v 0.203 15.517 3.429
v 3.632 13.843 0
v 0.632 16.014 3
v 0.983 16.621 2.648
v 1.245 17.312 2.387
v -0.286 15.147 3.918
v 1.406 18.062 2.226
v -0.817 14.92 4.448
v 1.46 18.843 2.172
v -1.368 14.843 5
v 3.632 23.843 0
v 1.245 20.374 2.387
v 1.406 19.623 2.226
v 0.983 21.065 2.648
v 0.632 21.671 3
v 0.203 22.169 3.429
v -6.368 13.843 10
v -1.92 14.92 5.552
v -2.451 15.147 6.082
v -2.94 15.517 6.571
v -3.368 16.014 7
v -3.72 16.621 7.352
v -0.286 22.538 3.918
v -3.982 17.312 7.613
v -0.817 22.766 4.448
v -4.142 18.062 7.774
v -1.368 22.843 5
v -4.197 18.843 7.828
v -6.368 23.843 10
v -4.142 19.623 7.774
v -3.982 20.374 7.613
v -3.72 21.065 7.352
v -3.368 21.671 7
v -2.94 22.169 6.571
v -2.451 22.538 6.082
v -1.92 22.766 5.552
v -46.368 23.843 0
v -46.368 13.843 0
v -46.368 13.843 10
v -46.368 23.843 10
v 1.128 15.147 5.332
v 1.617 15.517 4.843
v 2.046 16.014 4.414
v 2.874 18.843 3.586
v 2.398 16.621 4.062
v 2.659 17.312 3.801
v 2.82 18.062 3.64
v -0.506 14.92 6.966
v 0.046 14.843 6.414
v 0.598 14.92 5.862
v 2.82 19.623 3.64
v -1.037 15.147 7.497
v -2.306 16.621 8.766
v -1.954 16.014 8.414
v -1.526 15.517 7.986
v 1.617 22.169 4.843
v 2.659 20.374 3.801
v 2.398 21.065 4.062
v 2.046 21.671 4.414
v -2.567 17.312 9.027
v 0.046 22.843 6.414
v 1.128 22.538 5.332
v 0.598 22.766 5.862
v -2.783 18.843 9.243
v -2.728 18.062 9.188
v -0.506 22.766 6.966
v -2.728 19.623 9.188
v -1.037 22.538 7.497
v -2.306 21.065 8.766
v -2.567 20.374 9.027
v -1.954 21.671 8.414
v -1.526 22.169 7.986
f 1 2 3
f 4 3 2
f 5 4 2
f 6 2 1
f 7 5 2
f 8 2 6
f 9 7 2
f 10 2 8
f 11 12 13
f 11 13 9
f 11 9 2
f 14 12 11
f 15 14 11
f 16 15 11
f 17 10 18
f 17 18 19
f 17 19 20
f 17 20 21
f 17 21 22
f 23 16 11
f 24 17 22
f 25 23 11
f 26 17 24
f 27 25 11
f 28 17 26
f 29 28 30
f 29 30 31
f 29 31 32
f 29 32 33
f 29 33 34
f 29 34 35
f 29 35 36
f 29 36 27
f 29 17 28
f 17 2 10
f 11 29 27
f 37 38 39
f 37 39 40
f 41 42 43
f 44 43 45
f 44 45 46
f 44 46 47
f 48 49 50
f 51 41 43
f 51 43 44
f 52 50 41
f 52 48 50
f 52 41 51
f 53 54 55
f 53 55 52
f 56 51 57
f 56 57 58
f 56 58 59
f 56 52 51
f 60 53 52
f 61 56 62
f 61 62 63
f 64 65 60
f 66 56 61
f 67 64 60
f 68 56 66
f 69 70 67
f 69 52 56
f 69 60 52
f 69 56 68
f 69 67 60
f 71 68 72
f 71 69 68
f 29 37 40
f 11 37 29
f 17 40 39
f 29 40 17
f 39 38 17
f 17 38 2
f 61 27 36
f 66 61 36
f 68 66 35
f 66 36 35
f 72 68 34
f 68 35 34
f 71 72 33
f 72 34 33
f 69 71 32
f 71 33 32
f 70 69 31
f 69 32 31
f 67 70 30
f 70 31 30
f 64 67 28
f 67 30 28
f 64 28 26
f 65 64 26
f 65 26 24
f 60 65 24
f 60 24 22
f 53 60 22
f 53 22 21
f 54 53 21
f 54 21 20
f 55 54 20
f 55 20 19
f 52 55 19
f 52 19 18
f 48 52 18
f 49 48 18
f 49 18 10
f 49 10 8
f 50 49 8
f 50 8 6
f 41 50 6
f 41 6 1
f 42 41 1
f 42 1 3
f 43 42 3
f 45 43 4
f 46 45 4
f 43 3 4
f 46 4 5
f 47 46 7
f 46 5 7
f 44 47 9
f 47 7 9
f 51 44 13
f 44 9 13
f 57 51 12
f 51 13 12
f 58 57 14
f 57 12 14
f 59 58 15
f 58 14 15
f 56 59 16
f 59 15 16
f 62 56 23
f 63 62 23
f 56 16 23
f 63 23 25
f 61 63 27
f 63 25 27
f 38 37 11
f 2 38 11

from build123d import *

# Parameters (mm, degrees)
F0_W     = 50
F0_H     = 10
F1_DEPTH = 10
F2_SIZE  = 9.99999
F3_R     = 4
F4_DEPTH = 2


# Not quite as in the source:
# - a fillet or chamfer is up to 0.001 mm smaller than in the source, because OpenCascade refuses the exact size


with BuildPart() as f1:
    # F0 (on Top) → F1 (new body)
    with BuildSketch(Plane.XY):
        with Locations((-21.3684089482, 18.842792958)):
            Rectangle(F0_W, F0_H)
    extrude(amount=F1_DEPTH)

    # F2 (size 10 in the source; OpenCascade refuses exactly that, so slightly less here)
    f2_edges = [f1.edges().sort_by_distance(p)[0] for p in [
        (3.631591, 18.842793, 10),
    ]]
    chamfer(f2_edges, length=F2_SIZE)

    # F3 (on face) → F4 (join)
    with BuildSketch(Plane(origin=(1.8157955259, 0, 1.8157955259), x_dir=(0, 1, 0), z_dir=(0.7071067812, 0, 0.7071067812))):
        with Locations((18.842792958, 4.5031451526)):
            Circle(F3_R)
    extrude(amount=F4_DEPTH)


solid = f1.part
